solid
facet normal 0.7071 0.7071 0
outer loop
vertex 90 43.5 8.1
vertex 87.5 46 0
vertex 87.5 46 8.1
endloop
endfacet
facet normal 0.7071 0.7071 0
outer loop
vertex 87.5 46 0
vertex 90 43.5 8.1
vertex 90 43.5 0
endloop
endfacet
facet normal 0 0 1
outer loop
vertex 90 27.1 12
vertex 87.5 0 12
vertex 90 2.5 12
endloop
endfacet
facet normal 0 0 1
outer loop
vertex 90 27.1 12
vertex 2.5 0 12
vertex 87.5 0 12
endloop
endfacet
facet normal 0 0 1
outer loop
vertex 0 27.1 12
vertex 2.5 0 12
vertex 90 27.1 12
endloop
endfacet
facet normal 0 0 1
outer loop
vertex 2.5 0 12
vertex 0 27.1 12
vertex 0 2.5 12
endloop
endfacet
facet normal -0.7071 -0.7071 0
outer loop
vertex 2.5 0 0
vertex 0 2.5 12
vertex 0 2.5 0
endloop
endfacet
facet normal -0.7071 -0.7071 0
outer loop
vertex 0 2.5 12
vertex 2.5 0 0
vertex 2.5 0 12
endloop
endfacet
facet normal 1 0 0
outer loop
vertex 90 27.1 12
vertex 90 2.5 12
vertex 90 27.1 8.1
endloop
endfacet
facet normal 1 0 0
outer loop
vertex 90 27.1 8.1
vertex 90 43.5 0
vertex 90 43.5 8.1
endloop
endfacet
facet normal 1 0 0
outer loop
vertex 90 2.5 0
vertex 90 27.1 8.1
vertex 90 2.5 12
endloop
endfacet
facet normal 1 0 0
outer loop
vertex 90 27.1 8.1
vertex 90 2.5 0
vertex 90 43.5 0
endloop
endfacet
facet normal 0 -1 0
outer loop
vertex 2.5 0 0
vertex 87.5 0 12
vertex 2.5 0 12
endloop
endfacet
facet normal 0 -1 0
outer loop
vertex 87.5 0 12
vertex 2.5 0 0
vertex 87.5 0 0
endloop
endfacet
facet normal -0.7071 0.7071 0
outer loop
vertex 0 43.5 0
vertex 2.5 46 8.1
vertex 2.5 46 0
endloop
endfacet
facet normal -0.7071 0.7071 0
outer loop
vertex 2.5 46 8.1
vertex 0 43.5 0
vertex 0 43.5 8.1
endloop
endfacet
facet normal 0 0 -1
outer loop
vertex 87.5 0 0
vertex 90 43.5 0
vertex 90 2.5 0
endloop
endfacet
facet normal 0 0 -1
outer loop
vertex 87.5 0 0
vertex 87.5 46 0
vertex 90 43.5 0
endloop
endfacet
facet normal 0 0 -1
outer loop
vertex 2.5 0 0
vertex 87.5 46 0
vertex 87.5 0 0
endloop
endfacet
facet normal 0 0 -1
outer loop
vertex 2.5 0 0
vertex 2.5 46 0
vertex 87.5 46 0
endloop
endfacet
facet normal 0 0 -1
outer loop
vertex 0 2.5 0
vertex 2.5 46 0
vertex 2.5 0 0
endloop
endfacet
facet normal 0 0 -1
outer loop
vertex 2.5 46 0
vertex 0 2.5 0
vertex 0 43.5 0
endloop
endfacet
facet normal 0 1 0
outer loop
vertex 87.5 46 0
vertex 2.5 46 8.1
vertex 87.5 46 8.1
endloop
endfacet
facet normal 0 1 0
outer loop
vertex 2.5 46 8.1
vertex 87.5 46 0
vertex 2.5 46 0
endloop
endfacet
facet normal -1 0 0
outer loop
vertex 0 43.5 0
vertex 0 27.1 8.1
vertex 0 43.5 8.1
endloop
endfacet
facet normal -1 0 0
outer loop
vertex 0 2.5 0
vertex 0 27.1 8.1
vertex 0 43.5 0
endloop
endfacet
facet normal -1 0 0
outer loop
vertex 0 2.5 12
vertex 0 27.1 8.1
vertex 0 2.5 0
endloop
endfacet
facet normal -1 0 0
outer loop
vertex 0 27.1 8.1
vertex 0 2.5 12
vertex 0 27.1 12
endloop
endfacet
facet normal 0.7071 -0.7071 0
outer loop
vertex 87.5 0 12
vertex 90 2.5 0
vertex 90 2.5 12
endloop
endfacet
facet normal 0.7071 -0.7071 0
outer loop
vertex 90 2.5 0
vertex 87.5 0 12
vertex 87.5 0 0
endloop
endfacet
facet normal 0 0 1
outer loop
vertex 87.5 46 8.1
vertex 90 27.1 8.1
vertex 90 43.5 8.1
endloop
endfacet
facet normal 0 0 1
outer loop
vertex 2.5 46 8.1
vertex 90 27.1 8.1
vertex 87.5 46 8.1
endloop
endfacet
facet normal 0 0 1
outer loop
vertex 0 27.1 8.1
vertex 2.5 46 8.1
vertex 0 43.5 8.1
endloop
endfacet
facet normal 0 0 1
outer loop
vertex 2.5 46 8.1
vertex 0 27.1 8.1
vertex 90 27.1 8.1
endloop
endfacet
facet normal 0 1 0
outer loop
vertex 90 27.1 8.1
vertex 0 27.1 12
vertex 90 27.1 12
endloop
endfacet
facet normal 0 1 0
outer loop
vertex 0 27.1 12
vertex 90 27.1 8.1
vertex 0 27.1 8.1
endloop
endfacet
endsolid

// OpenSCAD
$fn = 32;

// ----------------------------------------------------------------------
// Stepped bar: sidestep, 90 x 46 x 12/8.1 mm
// ----------------------------------------------------------------------

// --- parameters (mm) ---
bar_l = 90;               // bar length, X
bar_w = 46;               // bar width, Y
plate_t = 12;             // thickness of the thick zone, Z
thin_t = 8.1;             // thickness of the thin zone
corner_c = 2.5;           // corner chamfer of the bar
step_cut = 3.9;           // material removed from the thin zone
ledge_y = 27.1;           // start of the ledge from the front edge
depth_1 = 3.9;            // depth of cut 1 from the top face

profile = [[2.5, 0], [87.5, 0], [90, 2.5], [90, 43.5], [87.5, 46], [2.5, 46], [0, 43.5], [0, 2.5]];  // primary outline, 8 points, counter clockwise
void_1 = [[-1, 27.1], [91, 27.1], [91, 47], [-1, 47]];  // ledge cut along one edge, 4 points

// --- the one profile operation ---
difference() {
  linear_extrude(height = plate_t) polygon(points = profile);
  translate([0, 0, plate_t - depth_1])
    linear_extrude(height = depth_1 + 1) polygon(points = void_1);
}
